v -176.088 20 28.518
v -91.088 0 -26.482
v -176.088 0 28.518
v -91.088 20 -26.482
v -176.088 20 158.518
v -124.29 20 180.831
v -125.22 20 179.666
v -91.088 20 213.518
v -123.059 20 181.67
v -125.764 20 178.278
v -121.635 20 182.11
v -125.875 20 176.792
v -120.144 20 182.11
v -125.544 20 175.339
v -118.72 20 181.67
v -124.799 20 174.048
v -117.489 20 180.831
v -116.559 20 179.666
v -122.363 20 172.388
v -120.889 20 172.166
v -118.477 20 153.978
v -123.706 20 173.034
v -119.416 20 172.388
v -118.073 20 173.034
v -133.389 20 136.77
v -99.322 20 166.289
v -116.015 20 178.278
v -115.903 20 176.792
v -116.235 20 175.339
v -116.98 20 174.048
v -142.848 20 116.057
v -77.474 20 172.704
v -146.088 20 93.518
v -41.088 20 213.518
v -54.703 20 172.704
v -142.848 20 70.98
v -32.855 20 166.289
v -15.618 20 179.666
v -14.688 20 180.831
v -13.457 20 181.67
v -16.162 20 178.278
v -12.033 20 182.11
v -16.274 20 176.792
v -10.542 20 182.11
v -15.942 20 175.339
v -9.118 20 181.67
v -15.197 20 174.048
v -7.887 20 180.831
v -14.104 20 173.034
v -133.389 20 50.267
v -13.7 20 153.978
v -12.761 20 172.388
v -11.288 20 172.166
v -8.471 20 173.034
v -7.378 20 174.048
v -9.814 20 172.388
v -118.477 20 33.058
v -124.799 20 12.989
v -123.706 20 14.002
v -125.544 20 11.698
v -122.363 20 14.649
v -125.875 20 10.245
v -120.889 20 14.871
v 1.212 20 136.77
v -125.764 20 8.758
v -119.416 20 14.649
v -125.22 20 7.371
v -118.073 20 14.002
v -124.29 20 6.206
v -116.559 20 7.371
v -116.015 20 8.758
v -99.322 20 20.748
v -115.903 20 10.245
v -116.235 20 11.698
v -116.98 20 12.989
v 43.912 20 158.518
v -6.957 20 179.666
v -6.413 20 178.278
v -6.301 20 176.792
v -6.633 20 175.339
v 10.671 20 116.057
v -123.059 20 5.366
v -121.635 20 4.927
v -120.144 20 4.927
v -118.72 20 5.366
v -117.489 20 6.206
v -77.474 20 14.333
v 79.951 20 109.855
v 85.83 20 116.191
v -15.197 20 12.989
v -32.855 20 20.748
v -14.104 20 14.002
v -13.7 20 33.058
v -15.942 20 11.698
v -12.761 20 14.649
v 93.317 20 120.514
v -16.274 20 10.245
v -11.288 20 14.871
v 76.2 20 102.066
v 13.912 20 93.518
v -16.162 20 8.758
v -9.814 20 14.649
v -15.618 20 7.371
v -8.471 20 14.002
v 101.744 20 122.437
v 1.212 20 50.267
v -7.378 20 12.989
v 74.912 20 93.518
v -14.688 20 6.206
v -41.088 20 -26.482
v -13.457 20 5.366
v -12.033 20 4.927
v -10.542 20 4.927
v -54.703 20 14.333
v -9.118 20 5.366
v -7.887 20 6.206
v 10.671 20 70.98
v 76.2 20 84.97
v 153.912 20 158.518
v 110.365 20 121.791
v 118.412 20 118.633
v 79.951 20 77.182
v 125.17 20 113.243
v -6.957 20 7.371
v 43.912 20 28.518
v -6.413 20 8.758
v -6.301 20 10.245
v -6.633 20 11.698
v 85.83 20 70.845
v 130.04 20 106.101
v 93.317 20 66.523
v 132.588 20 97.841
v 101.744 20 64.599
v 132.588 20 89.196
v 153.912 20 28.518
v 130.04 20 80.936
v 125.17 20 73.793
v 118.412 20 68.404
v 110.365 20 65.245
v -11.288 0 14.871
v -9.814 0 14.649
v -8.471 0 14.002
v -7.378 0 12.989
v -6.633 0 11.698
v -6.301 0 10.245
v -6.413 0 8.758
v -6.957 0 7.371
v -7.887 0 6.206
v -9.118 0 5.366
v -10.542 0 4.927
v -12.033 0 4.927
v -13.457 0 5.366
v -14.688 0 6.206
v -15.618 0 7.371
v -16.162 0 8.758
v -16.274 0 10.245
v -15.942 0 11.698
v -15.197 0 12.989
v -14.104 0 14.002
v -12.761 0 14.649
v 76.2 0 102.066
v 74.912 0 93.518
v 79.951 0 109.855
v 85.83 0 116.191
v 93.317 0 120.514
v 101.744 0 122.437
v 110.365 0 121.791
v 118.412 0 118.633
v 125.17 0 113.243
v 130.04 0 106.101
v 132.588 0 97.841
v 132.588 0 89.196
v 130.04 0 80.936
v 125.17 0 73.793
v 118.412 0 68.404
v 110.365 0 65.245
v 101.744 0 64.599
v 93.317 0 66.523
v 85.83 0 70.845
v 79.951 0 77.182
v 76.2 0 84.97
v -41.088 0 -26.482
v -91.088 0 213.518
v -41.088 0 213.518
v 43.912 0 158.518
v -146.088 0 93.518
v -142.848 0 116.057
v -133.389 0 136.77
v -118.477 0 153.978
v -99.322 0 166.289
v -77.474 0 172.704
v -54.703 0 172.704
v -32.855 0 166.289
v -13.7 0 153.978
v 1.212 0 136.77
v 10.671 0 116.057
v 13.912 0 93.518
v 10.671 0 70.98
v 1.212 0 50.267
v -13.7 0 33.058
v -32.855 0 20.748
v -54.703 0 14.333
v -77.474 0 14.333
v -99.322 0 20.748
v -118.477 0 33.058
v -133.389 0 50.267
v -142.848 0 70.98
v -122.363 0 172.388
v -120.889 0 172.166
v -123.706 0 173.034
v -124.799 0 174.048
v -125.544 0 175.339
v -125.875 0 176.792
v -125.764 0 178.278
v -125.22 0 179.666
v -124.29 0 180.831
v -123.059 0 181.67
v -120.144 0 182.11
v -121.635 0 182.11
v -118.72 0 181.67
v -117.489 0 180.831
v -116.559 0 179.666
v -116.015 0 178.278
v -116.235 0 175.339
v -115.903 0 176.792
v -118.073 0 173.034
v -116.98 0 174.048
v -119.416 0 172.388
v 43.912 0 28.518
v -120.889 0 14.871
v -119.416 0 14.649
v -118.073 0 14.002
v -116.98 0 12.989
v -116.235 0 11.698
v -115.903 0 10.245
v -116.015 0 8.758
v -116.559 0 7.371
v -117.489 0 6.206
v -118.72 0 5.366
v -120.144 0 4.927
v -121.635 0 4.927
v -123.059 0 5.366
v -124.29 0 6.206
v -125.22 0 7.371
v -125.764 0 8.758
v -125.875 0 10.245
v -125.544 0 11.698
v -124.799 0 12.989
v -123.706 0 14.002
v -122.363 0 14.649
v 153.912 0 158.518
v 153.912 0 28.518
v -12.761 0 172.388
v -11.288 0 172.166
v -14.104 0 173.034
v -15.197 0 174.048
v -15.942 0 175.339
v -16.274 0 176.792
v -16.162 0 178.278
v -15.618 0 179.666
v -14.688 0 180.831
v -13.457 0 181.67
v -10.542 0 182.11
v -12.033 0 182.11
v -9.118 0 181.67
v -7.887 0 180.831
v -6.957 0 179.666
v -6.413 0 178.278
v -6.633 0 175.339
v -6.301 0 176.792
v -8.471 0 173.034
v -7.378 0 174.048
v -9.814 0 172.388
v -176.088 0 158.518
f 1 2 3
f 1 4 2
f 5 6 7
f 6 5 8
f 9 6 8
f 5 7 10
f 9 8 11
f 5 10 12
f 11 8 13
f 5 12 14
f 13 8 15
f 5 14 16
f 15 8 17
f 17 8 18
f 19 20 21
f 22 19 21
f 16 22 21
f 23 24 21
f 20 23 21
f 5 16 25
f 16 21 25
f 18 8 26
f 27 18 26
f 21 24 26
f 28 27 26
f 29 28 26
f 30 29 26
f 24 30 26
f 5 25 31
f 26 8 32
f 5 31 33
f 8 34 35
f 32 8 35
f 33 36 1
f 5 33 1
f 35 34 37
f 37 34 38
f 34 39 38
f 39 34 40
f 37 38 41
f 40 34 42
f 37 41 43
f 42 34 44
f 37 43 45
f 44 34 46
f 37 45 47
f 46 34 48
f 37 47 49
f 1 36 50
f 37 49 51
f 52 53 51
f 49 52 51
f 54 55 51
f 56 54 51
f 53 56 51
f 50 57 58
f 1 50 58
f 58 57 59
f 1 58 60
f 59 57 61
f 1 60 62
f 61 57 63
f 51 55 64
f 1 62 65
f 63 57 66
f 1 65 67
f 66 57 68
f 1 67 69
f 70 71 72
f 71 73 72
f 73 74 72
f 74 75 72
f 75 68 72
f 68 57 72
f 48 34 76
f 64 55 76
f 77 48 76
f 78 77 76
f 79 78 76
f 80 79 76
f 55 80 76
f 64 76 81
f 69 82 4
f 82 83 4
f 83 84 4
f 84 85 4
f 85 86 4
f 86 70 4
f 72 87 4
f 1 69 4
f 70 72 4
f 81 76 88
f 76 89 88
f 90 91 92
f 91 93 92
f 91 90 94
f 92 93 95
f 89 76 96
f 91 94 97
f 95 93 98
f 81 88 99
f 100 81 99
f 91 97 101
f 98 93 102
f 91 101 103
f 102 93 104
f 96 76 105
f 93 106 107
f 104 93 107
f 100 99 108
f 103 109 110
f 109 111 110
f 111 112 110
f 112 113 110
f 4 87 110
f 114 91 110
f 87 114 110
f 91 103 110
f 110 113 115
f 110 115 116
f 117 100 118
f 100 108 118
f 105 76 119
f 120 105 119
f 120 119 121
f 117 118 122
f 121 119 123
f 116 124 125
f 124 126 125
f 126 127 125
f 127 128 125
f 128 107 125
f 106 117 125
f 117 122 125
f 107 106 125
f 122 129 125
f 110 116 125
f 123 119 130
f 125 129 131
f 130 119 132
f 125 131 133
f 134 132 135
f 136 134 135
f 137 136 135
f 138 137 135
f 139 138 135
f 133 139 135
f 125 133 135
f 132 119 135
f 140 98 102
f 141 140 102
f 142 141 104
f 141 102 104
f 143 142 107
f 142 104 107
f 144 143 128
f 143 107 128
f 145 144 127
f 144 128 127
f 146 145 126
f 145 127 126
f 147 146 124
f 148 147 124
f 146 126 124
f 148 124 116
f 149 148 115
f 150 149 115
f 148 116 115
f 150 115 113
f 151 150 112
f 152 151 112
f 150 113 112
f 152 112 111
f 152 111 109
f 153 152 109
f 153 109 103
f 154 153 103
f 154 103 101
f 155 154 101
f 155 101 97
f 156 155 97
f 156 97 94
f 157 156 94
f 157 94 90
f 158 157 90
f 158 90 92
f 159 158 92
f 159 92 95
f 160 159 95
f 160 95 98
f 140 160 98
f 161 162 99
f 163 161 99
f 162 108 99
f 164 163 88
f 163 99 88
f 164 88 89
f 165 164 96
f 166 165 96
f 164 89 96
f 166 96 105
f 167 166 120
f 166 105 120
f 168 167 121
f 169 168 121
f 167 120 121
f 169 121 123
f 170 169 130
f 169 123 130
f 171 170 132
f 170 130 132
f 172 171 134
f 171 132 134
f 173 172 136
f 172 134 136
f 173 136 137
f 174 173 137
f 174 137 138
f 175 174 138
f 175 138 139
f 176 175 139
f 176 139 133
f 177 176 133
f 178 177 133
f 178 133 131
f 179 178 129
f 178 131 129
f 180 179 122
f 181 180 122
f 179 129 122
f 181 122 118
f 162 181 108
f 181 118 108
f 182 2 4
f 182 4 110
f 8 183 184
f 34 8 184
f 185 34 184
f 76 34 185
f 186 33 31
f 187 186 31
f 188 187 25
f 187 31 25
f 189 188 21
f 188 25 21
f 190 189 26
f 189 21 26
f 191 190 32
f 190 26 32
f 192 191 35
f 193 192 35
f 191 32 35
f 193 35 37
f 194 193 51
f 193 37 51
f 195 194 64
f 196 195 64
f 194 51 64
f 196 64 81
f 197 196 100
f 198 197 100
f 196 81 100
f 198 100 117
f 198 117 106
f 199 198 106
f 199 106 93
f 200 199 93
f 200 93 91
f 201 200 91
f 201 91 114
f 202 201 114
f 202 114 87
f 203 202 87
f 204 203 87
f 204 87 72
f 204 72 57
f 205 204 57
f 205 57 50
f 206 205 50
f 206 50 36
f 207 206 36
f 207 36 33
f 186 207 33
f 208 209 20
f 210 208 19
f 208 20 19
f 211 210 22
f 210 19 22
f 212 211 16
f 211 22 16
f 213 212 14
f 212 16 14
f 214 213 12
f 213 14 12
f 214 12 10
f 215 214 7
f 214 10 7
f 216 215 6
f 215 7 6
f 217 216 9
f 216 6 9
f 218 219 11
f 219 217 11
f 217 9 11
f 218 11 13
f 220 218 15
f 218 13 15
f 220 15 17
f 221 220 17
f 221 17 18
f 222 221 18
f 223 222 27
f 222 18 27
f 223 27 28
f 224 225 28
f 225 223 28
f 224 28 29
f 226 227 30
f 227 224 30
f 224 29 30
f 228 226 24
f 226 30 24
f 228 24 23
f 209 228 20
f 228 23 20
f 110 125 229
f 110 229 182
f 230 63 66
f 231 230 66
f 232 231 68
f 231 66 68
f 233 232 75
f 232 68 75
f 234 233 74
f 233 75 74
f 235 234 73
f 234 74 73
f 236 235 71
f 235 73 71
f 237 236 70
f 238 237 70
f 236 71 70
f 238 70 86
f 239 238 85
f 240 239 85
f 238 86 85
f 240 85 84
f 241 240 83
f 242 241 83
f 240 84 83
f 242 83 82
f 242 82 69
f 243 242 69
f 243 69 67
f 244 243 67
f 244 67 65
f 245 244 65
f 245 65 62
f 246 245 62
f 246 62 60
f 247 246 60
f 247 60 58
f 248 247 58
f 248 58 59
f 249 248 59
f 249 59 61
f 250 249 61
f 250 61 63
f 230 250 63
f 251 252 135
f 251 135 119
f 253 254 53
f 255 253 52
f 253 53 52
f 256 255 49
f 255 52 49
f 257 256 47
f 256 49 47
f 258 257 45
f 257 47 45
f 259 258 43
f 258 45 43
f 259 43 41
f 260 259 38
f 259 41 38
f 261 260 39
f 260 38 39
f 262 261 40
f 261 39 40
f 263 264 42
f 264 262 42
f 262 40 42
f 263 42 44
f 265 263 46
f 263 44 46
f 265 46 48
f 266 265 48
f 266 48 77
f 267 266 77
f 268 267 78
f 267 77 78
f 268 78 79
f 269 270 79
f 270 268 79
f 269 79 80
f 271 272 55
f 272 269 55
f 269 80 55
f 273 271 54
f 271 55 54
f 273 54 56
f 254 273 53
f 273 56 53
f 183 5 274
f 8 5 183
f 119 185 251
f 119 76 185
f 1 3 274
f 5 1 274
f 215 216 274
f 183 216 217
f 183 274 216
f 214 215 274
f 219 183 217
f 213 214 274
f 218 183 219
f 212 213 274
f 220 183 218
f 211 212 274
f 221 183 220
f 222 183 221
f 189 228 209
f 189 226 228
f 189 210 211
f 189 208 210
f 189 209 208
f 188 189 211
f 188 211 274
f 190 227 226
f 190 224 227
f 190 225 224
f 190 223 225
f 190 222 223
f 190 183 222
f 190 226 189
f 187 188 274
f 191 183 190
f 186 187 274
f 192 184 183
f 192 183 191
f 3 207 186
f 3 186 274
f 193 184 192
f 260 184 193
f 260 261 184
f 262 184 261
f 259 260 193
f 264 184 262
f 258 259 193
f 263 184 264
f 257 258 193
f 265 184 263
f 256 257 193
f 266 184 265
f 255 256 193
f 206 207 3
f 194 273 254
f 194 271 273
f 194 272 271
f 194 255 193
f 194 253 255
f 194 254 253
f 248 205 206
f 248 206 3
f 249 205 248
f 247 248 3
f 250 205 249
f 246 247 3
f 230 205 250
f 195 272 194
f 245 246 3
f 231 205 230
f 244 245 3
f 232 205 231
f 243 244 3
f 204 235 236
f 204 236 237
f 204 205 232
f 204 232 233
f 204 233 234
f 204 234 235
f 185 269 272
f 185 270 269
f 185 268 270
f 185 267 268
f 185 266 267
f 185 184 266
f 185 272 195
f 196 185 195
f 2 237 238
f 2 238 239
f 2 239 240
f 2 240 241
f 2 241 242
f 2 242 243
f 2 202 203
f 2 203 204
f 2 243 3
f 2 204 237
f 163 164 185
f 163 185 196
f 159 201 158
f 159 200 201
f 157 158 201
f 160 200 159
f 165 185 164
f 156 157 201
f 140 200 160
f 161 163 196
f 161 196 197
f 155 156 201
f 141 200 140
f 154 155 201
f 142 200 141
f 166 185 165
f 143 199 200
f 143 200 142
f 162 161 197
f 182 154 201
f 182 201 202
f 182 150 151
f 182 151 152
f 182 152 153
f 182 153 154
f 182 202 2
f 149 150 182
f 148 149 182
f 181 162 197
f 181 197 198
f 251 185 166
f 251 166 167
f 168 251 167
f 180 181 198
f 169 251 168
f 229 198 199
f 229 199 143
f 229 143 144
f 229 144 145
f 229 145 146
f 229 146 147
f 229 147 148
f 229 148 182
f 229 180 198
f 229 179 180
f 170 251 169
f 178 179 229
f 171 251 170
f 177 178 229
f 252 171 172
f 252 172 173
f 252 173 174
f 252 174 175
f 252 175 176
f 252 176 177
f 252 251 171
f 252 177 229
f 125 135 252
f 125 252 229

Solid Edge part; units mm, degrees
sketch "Sketch1" plane through (0, 0, 0) normal (0, -1, 0) x (1, 0, 0)
  line L0 (-176.0885, -26.4817) -> (153.9115, -26.4817)
  line L1 (153.9115, -26.4817) -> (153.9115, 213.5183)
  line L2 (-176.0885, 213.5183) -> (153.9115, 213.5183)
  line L3 (-176.0885, -26.4817) -> (-176.0885, 213.5183)
  dimension "D1" = 330
  dimension "D2" = 240
extrude "Protrusion1" add sketch "Sketch1" against normal blind 20
sketch "Sketch2" plane through (3.9115, 20, 48.5183) normal (0, 1, 0) x (-1, 0, 0)
  circle A0 centre (70, 45) radius 80
  dimension "D1" = 110
  dimension "D2" = 160
extrude "Cutout1" cut sketch "Sketch2" against normal through all
sketch "Sketch3" plane through (3.9115, 20, 38.5183) normal (0, 1, 0) x (-1, 0, 0)
  circle A0 centre (-100, 55) radius 29
  dimension "D1" = 50
  dimension "D2" = 58
extrude "Cutout2" cut sketch "Sketch3" against normal through all
sketch "Sketch4" plane through (3.9115, 20, 73.5183) normal (0, 1, 0) x (-1, 0, 0)
  line L0 (180, 85) -> (95, 140)
  line L1 (95, 140) -> (180, 140)
  line L2 (180, 140) -> (180, 85)
  line L3 (-150, 140) -> (-150, 85)
  line L4 (-40, 85) -> (-150, 85)
  line L5 (45, 140) -> (-40, 85)
  line L6 (-150, 140) -> (45, 140)
  dimension "D1" = 195
  dimension "D2" = 85
  dimension "D3" = 55
  dimension "D4" = 110
  dimension "D5" = 55
extrude "Cutout3" cut sketch "Sketch4" against normal through all
hole "Hole_9" at (-11.2875, 20, 9.8711) direction (0, -1, 0) diameter 10 end up to next
hole "Hole1" at (-120.8894, 20, 9.8711) direction (0, -1, 0) diameter 10 end up to next
mirror "Mirror1" about plane through (-73.5885, 5, 93.5183) normal (0, 0, 1) of "Cutout3", "Hole_9", "Hole1"
